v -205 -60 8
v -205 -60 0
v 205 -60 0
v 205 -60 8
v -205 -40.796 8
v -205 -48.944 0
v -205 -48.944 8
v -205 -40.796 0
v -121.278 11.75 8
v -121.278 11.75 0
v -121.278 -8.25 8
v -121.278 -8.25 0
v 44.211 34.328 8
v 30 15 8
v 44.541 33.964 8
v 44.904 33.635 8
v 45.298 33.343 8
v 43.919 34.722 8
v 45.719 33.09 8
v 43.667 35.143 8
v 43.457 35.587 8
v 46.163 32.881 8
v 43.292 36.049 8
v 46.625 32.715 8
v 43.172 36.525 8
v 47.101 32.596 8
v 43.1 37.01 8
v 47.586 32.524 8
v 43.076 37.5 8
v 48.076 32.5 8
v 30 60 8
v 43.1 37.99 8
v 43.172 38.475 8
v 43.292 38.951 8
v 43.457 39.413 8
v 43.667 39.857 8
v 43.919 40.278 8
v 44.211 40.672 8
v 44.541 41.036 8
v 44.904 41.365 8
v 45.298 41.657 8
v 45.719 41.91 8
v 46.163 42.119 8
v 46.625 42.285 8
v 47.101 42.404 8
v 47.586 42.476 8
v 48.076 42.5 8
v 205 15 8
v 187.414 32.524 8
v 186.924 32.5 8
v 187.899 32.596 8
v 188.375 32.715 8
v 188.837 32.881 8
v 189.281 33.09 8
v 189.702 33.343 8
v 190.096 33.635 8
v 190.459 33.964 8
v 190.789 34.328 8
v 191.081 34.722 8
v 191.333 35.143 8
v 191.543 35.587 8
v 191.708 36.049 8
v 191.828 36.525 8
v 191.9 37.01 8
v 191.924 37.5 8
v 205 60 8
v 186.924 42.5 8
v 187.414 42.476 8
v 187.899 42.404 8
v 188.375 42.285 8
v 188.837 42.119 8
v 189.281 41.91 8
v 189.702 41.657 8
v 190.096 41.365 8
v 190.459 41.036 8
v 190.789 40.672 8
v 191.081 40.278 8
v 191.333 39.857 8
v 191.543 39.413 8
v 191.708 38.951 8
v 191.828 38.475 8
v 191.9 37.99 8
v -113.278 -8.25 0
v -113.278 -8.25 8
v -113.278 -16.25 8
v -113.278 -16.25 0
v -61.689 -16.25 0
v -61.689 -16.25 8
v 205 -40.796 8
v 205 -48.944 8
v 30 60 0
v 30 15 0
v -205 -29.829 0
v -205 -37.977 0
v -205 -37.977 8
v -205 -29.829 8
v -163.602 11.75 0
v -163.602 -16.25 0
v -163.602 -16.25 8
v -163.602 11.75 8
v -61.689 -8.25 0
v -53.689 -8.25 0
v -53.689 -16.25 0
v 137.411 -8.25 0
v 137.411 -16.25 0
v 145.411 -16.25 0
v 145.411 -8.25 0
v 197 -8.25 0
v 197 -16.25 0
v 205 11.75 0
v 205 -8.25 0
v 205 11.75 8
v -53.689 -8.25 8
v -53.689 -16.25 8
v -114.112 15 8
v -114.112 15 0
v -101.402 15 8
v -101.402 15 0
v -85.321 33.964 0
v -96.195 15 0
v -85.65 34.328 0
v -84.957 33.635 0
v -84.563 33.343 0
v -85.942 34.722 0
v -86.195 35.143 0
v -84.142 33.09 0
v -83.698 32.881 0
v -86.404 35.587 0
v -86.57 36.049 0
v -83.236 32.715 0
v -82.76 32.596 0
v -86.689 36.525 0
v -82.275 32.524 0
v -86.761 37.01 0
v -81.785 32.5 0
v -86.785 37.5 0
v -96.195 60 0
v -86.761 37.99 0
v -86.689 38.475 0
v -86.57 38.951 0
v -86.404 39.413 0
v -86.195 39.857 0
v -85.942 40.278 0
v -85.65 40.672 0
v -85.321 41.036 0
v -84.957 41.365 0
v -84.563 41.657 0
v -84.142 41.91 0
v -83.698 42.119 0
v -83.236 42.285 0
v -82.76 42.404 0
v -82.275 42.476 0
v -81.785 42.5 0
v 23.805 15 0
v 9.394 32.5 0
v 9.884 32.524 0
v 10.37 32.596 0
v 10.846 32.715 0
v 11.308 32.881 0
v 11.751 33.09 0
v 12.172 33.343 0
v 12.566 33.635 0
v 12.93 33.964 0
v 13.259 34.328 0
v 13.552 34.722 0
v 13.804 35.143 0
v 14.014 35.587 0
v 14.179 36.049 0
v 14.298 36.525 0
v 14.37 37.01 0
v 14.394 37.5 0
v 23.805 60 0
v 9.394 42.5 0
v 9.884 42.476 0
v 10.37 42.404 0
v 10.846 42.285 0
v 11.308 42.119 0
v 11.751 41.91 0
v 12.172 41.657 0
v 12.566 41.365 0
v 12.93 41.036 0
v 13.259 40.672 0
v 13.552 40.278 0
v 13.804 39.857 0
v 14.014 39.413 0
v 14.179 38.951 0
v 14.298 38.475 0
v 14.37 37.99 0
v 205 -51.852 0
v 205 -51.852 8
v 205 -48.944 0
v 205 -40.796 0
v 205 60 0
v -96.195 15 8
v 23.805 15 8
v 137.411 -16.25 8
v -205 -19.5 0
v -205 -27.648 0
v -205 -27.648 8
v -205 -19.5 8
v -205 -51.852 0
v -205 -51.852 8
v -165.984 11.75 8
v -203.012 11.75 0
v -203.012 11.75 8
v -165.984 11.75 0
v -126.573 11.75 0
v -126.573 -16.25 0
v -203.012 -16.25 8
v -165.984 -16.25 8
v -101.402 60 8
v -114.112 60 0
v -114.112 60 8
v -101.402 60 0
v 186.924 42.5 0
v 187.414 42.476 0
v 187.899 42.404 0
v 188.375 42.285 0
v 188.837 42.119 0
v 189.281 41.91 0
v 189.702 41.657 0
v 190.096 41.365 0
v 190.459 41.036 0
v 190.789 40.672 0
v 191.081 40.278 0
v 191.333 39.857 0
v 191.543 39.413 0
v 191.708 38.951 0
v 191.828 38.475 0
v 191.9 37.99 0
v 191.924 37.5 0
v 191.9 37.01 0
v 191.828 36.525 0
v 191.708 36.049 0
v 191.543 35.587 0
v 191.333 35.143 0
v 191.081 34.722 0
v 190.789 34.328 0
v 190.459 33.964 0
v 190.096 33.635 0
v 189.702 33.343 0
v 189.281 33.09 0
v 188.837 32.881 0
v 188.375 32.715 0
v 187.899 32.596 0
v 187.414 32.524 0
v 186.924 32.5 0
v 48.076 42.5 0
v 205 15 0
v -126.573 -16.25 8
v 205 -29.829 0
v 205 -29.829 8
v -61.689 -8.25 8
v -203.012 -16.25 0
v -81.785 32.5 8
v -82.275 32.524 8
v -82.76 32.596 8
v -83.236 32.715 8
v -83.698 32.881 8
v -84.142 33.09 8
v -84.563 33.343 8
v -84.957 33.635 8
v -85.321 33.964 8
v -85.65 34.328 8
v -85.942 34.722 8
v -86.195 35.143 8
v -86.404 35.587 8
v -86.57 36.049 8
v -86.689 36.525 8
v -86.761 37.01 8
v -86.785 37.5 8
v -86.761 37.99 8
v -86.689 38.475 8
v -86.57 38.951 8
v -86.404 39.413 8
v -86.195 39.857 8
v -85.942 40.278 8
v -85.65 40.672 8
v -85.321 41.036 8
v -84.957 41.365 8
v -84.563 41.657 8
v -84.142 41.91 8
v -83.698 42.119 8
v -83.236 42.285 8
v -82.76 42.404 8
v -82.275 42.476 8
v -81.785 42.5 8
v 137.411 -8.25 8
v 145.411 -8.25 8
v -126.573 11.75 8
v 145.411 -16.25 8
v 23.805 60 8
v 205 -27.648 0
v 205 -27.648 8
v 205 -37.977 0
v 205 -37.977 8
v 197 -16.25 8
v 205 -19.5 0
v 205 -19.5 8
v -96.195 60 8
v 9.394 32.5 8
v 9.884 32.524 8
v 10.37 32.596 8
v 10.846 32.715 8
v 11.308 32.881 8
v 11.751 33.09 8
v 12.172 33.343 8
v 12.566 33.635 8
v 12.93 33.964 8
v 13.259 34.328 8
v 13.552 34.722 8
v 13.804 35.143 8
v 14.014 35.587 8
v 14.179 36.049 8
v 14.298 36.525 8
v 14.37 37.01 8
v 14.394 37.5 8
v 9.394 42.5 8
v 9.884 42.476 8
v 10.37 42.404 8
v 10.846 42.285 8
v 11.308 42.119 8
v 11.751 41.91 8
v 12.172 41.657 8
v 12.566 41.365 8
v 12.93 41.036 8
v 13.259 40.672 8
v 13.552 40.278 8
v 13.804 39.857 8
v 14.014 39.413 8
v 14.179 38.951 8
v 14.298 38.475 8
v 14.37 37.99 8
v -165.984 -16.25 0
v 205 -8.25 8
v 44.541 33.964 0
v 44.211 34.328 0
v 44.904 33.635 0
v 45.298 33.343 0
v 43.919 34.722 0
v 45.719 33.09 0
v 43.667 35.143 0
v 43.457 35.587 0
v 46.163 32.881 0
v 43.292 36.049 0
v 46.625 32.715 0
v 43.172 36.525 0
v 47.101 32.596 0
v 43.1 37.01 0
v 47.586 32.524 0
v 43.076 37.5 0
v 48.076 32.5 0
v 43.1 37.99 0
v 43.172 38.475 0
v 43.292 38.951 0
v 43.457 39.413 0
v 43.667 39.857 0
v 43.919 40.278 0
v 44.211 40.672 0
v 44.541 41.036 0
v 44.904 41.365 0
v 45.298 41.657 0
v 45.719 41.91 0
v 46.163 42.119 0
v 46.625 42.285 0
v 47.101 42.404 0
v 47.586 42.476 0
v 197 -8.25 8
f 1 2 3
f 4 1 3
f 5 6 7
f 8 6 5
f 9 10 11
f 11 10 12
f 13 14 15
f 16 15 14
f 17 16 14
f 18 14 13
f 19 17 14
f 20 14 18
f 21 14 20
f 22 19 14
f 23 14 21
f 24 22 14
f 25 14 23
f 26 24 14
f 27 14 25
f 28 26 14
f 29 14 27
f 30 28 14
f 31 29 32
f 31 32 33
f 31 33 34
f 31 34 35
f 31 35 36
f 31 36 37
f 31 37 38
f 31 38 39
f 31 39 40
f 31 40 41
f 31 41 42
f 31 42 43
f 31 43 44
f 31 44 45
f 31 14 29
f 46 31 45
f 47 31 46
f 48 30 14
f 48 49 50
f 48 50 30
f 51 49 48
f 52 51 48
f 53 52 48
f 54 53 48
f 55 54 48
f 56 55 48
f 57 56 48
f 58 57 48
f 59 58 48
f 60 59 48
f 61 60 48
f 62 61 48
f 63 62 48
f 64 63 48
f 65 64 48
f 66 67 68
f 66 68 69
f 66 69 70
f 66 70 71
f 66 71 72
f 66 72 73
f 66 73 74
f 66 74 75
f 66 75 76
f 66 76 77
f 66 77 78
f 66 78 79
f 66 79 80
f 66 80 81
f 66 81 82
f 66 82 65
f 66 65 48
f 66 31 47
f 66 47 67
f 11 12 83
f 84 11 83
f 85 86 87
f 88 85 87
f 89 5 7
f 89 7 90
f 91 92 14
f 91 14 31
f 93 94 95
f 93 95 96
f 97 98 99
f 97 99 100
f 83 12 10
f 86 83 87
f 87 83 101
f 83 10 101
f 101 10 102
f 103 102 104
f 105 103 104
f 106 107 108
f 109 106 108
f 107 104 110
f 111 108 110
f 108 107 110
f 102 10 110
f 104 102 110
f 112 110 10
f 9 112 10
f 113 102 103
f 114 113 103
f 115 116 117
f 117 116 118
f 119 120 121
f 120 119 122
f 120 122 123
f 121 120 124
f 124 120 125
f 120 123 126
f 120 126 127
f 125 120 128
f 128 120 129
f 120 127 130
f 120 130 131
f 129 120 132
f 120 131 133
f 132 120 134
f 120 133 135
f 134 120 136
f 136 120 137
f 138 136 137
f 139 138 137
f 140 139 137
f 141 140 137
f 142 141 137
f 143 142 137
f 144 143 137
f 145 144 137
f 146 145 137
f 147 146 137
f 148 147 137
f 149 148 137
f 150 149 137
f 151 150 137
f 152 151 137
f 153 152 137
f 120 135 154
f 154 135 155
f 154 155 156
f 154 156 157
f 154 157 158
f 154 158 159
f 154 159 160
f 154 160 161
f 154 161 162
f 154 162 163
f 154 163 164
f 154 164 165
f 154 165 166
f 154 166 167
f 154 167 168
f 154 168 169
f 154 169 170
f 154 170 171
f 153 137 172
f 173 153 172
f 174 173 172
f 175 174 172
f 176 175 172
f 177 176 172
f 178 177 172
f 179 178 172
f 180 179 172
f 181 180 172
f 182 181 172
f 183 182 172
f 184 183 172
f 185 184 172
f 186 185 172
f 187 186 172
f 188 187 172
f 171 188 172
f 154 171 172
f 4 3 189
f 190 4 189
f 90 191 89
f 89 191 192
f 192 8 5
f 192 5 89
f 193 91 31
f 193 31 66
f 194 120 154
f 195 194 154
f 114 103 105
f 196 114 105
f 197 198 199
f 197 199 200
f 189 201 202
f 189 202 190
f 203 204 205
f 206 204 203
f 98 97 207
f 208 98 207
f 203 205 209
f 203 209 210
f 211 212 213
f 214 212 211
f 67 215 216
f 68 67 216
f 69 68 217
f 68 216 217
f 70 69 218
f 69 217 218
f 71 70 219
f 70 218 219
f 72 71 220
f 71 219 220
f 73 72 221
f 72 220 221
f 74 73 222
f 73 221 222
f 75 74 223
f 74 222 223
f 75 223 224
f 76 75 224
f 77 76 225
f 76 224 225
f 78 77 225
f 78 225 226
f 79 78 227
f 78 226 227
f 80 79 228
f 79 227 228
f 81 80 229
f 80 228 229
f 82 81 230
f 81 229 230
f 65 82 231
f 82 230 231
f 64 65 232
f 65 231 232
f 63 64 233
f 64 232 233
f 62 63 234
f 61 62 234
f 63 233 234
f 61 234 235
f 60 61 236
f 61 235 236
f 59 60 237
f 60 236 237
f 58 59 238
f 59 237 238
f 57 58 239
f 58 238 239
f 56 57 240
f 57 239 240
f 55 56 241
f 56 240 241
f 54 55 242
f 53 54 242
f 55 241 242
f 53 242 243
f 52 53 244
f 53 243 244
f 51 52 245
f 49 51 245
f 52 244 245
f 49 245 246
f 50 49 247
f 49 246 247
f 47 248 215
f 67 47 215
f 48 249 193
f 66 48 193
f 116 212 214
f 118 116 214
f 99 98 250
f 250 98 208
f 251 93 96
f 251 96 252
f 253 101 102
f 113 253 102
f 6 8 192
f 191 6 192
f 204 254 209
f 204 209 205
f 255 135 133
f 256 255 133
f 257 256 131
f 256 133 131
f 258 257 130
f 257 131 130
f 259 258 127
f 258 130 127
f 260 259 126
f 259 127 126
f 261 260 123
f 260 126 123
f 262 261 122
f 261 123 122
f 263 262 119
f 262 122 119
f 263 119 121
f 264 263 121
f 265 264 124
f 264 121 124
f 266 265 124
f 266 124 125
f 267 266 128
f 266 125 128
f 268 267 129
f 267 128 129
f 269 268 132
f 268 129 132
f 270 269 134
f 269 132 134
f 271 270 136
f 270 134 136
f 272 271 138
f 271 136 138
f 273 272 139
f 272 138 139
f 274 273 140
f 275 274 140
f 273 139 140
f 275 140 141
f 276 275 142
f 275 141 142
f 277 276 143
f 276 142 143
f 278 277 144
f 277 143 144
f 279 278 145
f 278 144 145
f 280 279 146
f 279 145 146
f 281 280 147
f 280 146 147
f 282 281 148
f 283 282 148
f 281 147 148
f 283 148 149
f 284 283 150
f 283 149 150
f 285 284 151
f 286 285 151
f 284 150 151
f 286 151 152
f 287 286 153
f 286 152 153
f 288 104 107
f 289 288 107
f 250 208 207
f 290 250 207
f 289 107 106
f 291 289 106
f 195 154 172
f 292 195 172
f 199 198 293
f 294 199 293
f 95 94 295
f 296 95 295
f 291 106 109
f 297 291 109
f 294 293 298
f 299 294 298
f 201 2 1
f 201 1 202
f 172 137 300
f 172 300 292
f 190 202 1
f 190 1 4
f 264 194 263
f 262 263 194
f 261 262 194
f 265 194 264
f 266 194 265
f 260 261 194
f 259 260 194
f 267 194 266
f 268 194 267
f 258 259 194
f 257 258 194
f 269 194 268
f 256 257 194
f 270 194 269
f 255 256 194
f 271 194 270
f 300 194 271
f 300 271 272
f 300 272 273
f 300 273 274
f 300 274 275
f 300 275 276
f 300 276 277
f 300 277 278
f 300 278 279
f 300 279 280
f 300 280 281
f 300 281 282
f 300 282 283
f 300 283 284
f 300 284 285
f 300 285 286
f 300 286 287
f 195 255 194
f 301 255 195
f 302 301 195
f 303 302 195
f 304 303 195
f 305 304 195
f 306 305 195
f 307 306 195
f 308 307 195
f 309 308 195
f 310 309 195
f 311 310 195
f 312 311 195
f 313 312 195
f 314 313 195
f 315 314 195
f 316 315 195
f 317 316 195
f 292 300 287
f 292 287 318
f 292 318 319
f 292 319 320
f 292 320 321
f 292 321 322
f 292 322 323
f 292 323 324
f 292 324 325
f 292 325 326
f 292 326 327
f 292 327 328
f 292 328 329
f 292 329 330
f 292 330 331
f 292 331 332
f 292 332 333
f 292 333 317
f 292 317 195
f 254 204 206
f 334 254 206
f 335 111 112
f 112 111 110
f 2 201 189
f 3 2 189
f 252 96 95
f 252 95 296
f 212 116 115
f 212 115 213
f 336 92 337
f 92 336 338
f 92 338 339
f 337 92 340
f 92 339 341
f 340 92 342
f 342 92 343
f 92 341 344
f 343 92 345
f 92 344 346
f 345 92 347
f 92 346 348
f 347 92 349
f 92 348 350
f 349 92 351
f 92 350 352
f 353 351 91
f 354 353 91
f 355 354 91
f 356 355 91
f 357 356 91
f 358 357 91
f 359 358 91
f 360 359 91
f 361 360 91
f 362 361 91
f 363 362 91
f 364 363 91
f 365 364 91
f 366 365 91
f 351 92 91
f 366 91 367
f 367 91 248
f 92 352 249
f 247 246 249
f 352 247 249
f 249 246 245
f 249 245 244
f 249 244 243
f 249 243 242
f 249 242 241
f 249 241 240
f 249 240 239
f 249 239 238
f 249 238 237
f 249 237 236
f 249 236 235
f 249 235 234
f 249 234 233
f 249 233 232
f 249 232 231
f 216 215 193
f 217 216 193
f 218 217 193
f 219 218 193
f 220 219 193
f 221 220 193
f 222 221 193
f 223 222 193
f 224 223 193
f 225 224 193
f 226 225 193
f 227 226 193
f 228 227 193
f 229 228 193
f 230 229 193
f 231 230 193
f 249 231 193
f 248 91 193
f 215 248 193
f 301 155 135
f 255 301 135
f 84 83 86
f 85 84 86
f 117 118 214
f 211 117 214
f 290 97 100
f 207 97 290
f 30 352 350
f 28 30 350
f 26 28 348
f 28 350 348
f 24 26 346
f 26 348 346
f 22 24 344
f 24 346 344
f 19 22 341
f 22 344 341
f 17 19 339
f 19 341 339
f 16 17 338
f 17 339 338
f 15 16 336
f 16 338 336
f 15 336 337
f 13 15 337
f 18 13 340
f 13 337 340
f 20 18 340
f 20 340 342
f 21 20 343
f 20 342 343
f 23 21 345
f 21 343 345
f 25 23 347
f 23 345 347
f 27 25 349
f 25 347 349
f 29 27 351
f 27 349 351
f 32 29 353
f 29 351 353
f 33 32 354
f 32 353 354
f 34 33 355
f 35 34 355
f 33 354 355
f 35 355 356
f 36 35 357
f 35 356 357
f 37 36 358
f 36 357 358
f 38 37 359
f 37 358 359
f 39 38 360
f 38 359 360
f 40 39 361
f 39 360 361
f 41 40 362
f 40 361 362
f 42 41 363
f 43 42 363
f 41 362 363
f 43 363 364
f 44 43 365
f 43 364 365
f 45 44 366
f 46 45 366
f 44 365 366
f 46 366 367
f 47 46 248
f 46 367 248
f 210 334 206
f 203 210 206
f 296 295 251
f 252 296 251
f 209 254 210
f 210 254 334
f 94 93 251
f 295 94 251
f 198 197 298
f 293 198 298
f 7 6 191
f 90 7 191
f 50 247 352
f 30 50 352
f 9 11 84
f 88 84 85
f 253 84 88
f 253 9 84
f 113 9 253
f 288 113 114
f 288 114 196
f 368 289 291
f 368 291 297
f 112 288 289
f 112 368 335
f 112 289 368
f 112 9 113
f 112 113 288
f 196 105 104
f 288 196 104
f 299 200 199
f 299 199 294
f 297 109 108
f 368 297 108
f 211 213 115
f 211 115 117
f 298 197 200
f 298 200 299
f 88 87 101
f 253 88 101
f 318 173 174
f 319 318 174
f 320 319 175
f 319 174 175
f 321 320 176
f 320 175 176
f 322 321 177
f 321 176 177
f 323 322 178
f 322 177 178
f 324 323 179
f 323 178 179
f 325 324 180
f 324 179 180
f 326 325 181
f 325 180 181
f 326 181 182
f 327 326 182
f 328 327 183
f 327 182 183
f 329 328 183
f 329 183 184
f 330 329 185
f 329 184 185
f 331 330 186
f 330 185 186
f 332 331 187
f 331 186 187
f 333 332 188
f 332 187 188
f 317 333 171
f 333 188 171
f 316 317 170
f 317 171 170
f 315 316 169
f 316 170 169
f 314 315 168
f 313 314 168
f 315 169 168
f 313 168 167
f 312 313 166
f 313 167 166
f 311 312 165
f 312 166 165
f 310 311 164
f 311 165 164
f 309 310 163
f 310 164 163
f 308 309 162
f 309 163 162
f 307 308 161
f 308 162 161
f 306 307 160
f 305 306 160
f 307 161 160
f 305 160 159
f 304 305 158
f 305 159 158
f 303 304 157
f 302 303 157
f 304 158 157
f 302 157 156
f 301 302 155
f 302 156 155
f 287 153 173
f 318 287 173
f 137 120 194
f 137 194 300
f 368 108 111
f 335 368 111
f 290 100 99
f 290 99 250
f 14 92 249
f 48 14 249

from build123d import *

# Parameters (mm, degrees)
F0_W     = 175
F0_H     = 45
F0_W_2   = 120
F0_W_3   = 12.709826
F0_W_4   = 410
F0_H_2   = 8.147681
F0_H_3   = 8.14768
F0_W_5   = 37.028447
F0_H_4   = 28
F1_DEPTH = 8


with BuildPart() as f1:
    # F0 (on Top) → F1 (new body)
    with BuildSketch(Plane.XY):
        with Locations((117.5, 37.5)):
            Rectangle(F0_W, F0_H)
        with BuildLine():
            Line((186.923676, 32.5), (48.076324, 32.5))
            ThreePointArc((48.076324, 32.5), (43.076324, 37.5), (48.076324, 42.5))
            Line((48.076324, 42.5), (186.923676, 42.5))
            ThreePointArc((186.923676, 42.5), (191.923676, 37.5), (186.923676, 32.5))
        make_face(mode=Mode.SUBTRACT)
        with Locations((-36.195388, 37.5)):
            Rectangle(F0_W_2, F0_H)
        with BuildLine():
            ThreePointArc((-81.785001, 32.5), (-86.785001, 37.5), (-81.785001, 42.5))
            Line((-81.785001, 42.5), (9.394225, 42.5))
            ThreePointArc((9.394225, 42.5), (14.394225, 37.5), (9.394225, 32.5))
            Line((9.394225, 32.5), (-81.785001, 32.5))
        make_face(mode=Mode.SUBTRACT)
        with Locations((-107.757263, 37.5)):
            Rectangle(F0_W_3, F0_H)
        Polygon((205, -8.25), (205, 11.75), (-121.278131, 11.75), (-121.278131, -8.25), (-113.278131, -8.25), (-113.278131, -16.25), (-61.689003, -16.25), (-61.689003, -8.25), (-53.689003, -8.25), (-53.689003, -16.25), (137.410872, -16.25), (137.410872, -8.25), (145.410872, -8.25), (145.410872, -16.25), (197, -16.25), (197, -8.25), align=None)
        with Locations((0, -23.57384)):
            Rectangle(F0_W_4, F0_H_2)
        with Locations((0, -33.902851)):
            Rectangle(F0_W_4, F0_H_3)
        with Locations((0, -55.926159)):
            Rectangle(F0_W_4, F0_H_2)
        with Locations((0, -44.869955)):
            Rectangle(F0_W_4, F0_H_3)
        with Locations((-145.087354, -2.25)):
            Rectangle(F0_W_5, F0_H_4)
        with Locations((-184.498123, -2.25)):
            Rectangle(F0_W_5, F0_H_4)
    extrude(amount=F1_DEPTH)


solid = f1.part
